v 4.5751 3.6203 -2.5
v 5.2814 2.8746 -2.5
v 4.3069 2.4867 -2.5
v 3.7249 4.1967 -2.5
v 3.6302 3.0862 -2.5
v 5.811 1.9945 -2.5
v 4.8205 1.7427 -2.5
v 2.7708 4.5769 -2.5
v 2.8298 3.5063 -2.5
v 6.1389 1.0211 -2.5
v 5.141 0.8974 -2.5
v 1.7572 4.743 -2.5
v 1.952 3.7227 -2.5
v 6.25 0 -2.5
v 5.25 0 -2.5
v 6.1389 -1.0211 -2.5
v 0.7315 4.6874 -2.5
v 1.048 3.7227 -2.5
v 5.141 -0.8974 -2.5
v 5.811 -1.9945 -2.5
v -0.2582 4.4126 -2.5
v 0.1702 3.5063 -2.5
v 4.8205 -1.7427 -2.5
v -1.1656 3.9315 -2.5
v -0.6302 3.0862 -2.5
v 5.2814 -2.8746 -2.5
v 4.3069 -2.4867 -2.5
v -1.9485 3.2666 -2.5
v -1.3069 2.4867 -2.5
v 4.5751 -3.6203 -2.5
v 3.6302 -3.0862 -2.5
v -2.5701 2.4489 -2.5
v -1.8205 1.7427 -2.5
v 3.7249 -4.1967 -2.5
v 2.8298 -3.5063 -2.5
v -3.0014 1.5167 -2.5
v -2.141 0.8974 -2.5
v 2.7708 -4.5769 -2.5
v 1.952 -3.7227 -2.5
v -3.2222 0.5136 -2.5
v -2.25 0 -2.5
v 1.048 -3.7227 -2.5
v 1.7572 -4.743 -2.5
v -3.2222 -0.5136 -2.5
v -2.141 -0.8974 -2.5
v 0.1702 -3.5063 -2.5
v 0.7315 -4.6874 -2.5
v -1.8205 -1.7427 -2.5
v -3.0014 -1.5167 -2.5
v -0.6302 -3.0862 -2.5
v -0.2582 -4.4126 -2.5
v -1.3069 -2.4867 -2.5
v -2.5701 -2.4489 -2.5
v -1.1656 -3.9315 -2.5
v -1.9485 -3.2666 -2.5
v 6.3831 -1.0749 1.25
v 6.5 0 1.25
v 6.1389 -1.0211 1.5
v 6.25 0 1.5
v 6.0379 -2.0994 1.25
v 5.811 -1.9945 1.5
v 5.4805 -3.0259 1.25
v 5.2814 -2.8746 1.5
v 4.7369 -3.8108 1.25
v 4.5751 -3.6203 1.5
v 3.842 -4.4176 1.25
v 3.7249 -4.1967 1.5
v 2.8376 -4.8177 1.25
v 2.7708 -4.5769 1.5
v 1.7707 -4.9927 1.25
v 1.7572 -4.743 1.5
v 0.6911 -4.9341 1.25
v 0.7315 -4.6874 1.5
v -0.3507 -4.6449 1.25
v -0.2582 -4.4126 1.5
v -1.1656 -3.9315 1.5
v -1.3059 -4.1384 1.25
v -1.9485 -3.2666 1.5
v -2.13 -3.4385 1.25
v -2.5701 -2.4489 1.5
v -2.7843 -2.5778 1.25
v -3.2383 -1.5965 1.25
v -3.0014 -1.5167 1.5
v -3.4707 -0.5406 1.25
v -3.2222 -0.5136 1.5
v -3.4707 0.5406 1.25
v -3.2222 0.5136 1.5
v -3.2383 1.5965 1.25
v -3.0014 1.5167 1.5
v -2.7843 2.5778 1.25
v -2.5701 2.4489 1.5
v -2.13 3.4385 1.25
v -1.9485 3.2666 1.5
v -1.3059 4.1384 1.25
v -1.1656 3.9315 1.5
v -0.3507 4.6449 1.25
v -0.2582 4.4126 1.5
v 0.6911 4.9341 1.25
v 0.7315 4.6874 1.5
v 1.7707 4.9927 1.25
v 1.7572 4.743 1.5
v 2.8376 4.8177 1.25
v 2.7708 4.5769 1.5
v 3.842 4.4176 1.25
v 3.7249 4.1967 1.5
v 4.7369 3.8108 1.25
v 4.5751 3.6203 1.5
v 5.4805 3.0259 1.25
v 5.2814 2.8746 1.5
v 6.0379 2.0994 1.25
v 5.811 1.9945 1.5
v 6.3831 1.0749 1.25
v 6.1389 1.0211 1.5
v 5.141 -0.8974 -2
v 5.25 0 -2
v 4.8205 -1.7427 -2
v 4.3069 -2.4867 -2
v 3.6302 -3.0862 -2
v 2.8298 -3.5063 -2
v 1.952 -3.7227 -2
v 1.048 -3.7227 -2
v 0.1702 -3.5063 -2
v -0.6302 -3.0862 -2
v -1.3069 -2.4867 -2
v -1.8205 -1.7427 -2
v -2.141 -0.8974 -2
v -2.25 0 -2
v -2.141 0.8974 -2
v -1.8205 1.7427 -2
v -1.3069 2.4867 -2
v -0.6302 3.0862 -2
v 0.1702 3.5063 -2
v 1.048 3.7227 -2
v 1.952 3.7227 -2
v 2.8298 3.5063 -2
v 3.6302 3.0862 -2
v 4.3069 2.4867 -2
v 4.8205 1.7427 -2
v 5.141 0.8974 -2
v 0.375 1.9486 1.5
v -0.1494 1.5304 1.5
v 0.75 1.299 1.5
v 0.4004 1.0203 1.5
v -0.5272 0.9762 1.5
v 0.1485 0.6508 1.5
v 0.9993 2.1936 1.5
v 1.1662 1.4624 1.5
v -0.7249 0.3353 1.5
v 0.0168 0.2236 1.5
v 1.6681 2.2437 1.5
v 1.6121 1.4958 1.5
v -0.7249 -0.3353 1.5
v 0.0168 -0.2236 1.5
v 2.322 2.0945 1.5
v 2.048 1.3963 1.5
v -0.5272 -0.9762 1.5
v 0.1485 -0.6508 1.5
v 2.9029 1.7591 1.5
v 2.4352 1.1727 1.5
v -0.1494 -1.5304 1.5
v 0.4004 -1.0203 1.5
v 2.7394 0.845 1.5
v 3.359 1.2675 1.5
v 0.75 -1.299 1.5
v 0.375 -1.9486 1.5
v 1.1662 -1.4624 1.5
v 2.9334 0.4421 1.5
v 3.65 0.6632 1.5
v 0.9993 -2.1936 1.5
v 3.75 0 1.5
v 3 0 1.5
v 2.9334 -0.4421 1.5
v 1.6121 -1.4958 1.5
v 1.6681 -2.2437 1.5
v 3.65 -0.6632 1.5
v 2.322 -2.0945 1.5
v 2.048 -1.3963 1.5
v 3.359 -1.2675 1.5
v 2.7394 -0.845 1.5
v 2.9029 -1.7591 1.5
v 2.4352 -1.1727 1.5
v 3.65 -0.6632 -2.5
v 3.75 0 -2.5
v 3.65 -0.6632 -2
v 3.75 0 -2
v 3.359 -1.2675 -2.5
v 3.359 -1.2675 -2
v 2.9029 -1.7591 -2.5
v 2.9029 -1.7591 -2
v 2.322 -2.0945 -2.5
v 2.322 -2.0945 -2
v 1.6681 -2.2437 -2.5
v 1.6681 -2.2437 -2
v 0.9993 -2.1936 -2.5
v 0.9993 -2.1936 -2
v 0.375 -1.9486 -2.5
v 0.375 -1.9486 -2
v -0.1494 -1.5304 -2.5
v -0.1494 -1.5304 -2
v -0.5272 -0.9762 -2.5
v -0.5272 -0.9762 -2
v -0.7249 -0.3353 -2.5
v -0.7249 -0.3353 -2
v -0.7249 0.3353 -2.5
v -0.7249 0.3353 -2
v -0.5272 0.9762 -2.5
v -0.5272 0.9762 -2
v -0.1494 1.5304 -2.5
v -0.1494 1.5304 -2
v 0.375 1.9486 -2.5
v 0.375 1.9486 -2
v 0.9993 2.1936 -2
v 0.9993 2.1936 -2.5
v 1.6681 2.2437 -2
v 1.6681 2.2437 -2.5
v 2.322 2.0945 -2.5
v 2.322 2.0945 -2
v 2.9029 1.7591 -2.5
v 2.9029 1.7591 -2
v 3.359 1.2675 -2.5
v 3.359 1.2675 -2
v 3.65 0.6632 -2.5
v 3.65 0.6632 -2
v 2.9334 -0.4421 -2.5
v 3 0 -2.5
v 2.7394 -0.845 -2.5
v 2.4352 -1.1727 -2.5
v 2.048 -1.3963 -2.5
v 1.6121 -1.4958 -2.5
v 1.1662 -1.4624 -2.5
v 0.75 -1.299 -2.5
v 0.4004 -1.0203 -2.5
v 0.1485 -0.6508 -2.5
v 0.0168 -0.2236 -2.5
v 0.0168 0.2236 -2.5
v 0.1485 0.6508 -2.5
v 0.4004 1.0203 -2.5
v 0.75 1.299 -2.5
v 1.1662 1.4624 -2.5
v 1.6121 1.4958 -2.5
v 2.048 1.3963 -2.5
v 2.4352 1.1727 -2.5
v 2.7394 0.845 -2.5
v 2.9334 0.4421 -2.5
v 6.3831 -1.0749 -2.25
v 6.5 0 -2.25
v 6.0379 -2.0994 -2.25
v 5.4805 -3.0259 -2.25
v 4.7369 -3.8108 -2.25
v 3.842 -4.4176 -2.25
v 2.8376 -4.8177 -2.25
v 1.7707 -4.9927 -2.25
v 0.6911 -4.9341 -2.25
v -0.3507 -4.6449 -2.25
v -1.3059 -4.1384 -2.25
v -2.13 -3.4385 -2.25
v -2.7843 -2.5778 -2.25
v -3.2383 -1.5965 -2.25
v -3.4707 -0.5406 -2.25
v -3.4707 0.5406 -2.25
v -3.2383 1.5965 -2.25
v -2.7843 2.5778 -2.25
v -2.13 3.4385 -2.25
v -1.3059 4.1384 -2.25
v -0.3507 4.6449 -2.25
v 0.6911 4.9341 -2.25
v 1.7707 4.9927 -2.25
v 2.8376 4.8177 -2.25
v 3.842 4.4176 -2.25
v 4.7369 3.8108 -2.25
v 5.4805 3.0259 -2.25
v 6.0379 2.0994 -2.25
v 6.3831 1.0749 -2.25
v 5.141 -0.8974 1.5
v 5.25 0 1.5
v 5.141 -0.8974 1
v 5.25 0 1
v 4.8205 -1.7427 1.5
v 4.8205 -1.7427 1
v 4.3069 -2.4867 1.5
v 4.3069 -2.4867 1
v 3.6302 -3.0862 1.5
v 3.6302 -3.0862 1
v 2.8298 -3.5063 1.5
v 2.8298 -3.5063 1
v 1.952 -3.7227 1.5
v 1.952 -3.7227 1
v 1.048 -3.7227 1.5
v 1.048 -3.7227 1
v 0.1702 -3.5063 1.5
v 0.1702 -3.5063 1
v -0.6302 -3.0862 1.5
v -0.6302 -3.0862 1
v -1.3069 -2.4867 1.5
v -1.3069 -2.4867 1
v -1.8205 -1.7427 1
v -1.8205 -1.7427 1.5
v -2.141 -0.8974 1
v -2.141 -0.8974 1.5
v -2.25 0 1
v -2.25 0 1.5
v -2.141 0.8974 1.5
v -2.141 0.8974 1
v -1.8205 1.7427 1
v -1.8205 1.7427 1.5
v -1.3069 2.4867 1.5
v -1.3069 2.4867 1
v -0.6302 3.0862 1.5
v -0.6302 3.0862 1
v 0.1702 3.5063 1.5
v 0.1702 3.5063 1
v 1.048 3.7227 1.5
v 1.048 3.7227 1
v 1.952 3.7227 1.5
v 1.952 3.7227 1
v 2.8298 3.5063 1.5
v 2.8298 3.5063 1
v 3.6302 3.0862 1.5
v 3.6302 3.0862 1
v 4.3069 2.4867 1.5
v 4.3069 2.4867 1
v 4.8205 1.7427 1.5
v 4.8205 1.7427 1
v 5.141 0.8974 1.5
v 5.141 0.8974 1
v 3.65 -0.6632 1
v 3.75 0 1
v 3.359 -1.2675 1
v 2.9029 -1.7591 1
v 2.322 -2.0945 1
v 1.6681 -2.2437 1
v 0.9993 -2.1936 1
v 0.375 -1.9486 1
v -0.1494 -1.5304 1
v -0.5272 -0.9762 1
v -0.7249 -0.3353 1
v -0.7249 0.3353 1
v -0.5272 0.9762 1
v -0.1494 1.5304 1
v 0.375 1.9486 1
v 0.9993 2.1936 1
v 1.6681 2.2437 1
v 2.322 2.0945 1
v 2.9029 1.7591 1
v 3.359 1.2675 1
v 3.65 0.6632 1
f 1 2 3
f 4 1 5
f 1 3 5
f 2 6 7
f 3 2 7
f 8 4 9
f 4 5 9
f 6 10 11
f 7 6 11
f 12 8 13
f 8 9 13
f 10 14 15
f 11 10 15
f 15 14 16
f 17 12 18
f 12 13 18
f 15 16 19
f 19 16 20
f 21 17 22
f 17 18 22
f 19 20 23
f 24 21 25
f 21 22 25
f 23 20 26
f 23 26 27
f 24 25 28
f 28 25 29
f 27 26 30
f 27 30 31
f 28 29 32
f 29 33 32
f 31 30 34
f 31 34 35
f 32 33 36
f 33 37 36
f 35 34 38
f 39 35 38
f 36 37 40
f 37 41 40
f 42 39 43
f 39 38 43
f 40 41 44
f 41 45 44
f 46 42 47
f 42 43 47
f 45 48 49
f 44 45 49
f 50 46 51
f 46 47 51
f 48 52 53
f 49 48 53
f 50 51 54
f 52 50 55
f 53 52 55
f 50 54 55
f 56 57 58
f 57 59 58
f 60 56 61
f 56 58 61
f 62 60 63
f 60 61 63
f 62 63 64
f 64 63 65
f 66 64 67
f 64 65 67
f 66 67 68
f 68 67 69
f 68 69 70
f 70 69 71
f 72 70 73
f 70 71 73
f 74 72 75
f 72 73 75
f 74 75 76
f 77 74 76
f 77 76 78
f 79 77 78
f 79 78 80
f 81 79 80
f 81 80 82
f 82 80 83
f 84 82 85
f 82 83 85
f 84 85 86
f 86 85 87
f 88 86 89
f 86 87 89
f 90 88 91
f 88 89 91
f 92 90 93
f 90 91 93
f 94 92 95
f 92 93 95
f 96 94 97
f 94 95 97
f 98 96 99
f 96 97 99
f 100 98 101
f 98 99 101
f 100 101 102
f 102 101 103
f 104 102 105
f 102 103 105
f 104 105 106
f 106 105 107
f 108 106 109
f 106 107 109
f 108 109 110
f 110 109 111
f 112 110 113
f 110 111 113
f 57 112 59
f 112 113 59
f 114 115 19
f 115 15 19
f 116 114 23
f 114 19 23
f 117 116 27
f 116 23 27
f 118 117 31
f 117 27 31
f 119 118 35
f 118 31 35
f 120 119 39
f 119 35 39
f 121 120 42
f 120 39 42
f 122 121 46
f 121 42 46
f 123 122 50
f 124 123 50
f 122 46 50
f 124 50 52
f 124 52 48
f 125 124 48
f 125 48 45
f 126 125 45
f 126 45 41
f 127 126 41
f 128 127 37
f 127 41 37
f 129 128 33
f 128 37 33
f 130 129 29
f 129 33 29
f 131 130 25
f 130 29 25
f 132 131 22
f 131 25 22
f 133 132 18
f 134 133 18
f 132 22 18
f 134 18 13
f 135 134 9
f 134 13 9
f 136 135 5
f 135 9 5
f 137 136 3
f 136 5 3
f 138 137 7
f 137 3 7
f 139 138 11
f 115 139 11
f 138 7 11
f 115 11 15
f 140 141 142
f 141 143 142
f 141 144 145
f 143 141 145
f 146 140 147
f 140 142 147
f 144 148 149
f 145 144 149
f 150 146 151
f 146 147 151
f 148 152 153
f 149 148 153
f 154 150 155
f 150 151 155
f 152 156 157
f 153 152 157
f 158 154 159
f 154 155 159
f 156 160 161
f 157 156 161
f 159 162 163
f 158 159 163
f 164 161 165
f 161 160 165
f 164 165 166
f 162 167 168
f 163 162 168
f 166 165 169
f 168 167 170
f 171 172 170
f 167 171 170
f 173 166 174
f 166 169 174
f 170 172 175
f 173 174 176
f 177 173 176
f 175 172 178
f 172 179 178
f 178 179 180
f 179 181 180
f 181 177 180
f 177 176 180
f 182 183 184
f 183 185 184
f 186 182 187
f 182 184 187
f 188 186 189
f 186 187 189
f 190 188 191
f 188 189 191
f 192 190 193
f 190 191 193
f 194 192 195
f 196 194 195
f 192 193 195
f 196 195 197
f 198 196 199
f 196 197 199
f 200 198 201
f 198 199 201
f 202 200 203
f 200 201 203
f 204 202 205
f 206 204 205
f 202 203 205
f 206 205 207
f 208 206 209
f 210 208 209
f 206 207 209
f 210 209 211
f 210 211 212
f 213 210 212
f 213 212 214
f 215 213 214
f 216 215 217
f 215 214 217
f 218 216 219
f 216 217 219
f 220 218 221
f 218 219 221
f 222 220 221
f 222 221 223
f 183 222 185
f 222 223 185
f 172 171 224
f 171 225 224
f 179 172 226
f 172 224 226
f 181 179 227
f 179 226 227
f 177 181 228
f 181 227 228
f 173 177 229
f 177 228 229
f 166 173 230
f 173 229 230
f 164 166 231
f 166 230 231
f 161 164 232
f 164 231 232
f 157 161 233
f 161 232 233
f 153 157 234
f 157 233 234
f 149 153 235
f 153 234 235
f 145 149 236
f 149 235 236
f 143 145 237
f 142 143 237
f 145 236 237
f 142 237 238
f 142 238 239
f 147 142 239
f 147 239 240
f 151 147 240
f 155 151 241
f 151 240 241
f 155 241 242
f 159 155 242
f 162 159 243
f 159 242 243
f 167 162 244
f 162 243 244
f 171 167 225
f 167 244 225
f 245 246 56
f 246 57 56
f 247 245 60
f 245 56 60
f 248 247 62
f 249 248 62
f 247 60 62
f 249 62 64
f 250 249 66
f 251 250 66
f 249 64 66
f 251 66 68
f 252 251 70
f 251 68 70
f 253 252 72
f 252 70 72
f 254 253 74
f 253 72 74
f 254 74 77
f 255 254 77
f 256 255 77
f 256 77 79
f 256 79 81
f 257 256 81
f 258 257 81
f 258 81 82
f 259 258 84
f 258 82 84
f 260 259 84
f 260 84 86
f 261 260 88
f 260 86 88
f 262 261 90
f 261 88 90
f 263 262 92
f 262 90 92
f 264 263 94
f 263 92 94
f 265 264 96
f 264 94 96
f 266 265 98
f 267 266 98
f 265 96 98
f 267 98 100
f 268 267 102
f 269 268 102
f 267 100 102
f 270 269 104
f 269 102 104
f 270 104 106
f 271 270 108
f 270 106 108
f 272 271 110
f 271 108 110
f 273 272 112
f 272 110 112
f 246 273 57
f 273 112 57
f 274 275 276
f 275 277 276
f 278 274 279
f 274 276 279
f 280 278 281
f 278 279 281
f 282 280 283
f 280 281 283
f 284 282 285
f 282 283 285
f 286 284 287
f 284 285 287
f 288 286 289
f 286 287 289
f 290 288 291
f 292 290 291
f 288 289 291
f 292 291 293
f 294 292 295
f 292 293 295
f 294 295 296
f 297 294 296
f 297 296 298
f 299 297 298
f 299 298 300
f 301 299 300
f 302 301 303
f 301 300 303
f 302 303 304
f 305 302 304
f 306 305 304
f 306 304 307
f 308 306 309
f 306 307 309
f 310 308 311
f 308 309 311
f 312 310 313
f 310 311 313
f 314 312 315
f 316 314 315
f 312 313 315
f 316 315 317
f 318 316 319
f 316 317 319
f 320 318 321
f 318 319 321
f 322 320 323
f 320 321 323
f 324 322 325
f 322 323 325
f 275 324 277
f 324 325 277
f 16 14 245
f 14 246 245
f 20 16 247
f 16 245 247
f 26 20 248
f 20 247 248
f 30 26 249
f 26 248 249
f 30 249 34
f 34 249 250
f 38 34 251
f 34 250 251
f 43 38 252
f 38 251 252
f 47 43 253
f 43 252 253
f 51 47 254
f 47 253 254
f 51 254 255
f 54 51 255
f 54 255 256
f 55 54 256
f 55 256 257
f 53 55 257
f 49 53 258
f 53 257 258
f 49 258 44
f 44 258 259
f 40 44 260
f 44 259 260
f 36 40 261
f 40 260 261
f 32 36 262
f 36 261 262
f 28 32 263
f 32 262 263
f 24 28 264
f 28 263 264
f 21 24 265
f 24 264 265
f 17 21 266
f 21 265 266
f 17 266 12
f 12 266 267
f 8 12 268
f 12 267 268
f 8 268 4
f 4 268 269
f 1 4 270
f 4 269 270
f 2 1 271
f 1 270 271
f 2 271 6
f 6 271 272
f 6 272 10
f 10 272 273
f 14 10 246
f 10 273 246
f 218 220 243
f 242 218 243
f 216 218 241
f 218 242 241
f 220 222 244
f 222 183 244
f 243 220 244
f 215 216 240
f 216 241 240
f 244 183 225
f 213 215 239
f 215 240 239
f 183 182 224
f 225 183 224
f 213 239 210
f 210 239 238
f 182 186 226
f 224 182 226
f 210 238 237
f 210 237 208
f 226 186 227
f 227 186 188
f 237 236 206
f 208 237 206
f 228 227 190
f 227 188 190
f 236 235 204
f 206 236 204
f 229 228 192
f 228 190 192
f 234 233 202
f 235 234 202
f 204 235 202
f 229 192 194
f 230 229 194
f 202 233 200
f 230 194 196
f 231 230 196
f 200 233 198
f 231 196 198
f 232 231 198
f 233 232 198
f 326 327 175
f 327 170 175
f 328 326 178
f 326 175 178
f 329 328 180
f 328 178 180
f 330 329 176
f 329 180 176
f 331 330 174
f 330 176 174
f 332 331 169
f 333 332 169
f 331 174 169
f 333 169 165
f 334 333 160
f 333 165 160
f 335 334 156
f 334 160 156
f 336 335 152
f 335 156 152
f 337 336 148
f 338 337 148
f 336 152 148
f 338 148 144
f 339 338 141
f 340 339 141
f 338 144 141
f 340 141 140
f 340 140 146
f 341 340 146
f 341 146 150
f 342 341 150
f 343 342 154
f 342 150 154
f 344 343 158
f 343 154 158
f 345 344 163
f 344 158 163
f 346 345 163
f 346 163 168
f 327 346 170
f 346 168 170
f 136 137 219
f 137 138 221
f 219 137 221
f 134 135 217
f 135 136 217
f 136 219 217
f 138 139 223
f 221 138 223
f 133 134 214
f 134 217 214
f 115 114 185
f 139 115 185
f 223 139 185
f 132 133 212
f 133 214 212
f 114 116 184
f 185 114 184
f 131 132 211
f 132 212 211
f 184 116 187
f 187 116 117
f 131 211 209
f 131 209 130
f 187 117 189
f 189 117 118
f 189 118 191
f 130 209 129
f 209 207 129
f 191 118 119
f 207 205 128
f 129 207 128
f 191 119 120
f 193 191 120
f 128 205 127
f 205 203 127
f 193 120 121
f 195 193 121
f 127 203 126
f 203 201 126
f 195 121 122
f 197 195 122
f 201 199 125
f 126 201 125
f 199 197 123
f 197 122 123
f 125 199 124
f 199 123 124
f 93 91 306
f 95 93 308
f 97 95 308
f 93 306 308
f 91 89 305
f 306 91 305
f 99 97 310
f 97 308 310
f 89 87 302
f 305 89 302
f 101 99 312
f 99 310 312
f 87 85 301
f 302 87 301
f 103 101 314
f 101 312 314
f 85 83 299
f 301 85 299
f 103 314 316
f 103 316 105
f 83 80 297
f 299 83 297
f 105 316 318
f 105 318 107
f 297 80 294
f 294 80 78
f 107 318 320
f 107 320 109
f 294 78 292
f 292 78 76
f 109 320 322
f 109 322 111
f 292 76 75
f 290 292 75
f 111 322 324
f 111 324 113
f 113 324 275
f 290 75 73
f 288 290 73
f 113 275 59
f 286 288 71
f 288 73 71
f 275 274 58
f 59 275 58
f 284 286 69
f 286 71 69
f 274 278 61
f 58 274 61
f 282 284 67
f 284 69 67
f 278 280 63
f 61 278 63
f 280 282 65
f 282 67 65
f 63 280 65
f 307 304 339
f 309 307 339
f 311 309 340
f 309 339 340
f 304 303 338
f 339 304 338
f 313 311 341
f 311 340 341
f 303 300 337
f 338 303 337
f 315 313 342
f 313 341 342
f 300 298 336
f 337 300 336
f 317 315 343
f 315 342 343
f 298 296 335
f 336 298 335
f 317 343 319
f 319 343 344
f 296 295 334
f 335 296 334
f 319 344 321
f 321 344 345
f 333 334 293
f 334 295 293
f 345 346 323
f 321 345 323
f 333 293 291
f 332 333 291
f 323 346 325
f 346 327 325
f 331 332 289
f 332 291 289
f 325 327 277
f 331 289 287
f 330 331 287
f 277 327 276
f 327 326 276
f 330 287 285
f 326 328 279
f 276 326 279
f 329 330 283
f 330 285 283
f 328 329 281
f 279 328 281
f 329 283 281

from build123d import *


with BuildPart() as part:
    # Sketch1 → Revolve1 (revolve)
    with BuildSketch(Plane.XZ):
        Polygon((6.5, 1.25), (6.25, 1.5), (5.25, 1.5), (5.25, 1), (3.75, 1), (3.75, 1.5), (3, 1.5), (3, -2.5), (3.75, -2.5), (3.75, -2), (5.25, -2), (5.25, -2.5), (6.25, -2.5), (6.5, -2.25), align=None)
    revolve(axis=Axis((1.5, 0, 2.5), (0, 0, -1)))


solid = part.part
